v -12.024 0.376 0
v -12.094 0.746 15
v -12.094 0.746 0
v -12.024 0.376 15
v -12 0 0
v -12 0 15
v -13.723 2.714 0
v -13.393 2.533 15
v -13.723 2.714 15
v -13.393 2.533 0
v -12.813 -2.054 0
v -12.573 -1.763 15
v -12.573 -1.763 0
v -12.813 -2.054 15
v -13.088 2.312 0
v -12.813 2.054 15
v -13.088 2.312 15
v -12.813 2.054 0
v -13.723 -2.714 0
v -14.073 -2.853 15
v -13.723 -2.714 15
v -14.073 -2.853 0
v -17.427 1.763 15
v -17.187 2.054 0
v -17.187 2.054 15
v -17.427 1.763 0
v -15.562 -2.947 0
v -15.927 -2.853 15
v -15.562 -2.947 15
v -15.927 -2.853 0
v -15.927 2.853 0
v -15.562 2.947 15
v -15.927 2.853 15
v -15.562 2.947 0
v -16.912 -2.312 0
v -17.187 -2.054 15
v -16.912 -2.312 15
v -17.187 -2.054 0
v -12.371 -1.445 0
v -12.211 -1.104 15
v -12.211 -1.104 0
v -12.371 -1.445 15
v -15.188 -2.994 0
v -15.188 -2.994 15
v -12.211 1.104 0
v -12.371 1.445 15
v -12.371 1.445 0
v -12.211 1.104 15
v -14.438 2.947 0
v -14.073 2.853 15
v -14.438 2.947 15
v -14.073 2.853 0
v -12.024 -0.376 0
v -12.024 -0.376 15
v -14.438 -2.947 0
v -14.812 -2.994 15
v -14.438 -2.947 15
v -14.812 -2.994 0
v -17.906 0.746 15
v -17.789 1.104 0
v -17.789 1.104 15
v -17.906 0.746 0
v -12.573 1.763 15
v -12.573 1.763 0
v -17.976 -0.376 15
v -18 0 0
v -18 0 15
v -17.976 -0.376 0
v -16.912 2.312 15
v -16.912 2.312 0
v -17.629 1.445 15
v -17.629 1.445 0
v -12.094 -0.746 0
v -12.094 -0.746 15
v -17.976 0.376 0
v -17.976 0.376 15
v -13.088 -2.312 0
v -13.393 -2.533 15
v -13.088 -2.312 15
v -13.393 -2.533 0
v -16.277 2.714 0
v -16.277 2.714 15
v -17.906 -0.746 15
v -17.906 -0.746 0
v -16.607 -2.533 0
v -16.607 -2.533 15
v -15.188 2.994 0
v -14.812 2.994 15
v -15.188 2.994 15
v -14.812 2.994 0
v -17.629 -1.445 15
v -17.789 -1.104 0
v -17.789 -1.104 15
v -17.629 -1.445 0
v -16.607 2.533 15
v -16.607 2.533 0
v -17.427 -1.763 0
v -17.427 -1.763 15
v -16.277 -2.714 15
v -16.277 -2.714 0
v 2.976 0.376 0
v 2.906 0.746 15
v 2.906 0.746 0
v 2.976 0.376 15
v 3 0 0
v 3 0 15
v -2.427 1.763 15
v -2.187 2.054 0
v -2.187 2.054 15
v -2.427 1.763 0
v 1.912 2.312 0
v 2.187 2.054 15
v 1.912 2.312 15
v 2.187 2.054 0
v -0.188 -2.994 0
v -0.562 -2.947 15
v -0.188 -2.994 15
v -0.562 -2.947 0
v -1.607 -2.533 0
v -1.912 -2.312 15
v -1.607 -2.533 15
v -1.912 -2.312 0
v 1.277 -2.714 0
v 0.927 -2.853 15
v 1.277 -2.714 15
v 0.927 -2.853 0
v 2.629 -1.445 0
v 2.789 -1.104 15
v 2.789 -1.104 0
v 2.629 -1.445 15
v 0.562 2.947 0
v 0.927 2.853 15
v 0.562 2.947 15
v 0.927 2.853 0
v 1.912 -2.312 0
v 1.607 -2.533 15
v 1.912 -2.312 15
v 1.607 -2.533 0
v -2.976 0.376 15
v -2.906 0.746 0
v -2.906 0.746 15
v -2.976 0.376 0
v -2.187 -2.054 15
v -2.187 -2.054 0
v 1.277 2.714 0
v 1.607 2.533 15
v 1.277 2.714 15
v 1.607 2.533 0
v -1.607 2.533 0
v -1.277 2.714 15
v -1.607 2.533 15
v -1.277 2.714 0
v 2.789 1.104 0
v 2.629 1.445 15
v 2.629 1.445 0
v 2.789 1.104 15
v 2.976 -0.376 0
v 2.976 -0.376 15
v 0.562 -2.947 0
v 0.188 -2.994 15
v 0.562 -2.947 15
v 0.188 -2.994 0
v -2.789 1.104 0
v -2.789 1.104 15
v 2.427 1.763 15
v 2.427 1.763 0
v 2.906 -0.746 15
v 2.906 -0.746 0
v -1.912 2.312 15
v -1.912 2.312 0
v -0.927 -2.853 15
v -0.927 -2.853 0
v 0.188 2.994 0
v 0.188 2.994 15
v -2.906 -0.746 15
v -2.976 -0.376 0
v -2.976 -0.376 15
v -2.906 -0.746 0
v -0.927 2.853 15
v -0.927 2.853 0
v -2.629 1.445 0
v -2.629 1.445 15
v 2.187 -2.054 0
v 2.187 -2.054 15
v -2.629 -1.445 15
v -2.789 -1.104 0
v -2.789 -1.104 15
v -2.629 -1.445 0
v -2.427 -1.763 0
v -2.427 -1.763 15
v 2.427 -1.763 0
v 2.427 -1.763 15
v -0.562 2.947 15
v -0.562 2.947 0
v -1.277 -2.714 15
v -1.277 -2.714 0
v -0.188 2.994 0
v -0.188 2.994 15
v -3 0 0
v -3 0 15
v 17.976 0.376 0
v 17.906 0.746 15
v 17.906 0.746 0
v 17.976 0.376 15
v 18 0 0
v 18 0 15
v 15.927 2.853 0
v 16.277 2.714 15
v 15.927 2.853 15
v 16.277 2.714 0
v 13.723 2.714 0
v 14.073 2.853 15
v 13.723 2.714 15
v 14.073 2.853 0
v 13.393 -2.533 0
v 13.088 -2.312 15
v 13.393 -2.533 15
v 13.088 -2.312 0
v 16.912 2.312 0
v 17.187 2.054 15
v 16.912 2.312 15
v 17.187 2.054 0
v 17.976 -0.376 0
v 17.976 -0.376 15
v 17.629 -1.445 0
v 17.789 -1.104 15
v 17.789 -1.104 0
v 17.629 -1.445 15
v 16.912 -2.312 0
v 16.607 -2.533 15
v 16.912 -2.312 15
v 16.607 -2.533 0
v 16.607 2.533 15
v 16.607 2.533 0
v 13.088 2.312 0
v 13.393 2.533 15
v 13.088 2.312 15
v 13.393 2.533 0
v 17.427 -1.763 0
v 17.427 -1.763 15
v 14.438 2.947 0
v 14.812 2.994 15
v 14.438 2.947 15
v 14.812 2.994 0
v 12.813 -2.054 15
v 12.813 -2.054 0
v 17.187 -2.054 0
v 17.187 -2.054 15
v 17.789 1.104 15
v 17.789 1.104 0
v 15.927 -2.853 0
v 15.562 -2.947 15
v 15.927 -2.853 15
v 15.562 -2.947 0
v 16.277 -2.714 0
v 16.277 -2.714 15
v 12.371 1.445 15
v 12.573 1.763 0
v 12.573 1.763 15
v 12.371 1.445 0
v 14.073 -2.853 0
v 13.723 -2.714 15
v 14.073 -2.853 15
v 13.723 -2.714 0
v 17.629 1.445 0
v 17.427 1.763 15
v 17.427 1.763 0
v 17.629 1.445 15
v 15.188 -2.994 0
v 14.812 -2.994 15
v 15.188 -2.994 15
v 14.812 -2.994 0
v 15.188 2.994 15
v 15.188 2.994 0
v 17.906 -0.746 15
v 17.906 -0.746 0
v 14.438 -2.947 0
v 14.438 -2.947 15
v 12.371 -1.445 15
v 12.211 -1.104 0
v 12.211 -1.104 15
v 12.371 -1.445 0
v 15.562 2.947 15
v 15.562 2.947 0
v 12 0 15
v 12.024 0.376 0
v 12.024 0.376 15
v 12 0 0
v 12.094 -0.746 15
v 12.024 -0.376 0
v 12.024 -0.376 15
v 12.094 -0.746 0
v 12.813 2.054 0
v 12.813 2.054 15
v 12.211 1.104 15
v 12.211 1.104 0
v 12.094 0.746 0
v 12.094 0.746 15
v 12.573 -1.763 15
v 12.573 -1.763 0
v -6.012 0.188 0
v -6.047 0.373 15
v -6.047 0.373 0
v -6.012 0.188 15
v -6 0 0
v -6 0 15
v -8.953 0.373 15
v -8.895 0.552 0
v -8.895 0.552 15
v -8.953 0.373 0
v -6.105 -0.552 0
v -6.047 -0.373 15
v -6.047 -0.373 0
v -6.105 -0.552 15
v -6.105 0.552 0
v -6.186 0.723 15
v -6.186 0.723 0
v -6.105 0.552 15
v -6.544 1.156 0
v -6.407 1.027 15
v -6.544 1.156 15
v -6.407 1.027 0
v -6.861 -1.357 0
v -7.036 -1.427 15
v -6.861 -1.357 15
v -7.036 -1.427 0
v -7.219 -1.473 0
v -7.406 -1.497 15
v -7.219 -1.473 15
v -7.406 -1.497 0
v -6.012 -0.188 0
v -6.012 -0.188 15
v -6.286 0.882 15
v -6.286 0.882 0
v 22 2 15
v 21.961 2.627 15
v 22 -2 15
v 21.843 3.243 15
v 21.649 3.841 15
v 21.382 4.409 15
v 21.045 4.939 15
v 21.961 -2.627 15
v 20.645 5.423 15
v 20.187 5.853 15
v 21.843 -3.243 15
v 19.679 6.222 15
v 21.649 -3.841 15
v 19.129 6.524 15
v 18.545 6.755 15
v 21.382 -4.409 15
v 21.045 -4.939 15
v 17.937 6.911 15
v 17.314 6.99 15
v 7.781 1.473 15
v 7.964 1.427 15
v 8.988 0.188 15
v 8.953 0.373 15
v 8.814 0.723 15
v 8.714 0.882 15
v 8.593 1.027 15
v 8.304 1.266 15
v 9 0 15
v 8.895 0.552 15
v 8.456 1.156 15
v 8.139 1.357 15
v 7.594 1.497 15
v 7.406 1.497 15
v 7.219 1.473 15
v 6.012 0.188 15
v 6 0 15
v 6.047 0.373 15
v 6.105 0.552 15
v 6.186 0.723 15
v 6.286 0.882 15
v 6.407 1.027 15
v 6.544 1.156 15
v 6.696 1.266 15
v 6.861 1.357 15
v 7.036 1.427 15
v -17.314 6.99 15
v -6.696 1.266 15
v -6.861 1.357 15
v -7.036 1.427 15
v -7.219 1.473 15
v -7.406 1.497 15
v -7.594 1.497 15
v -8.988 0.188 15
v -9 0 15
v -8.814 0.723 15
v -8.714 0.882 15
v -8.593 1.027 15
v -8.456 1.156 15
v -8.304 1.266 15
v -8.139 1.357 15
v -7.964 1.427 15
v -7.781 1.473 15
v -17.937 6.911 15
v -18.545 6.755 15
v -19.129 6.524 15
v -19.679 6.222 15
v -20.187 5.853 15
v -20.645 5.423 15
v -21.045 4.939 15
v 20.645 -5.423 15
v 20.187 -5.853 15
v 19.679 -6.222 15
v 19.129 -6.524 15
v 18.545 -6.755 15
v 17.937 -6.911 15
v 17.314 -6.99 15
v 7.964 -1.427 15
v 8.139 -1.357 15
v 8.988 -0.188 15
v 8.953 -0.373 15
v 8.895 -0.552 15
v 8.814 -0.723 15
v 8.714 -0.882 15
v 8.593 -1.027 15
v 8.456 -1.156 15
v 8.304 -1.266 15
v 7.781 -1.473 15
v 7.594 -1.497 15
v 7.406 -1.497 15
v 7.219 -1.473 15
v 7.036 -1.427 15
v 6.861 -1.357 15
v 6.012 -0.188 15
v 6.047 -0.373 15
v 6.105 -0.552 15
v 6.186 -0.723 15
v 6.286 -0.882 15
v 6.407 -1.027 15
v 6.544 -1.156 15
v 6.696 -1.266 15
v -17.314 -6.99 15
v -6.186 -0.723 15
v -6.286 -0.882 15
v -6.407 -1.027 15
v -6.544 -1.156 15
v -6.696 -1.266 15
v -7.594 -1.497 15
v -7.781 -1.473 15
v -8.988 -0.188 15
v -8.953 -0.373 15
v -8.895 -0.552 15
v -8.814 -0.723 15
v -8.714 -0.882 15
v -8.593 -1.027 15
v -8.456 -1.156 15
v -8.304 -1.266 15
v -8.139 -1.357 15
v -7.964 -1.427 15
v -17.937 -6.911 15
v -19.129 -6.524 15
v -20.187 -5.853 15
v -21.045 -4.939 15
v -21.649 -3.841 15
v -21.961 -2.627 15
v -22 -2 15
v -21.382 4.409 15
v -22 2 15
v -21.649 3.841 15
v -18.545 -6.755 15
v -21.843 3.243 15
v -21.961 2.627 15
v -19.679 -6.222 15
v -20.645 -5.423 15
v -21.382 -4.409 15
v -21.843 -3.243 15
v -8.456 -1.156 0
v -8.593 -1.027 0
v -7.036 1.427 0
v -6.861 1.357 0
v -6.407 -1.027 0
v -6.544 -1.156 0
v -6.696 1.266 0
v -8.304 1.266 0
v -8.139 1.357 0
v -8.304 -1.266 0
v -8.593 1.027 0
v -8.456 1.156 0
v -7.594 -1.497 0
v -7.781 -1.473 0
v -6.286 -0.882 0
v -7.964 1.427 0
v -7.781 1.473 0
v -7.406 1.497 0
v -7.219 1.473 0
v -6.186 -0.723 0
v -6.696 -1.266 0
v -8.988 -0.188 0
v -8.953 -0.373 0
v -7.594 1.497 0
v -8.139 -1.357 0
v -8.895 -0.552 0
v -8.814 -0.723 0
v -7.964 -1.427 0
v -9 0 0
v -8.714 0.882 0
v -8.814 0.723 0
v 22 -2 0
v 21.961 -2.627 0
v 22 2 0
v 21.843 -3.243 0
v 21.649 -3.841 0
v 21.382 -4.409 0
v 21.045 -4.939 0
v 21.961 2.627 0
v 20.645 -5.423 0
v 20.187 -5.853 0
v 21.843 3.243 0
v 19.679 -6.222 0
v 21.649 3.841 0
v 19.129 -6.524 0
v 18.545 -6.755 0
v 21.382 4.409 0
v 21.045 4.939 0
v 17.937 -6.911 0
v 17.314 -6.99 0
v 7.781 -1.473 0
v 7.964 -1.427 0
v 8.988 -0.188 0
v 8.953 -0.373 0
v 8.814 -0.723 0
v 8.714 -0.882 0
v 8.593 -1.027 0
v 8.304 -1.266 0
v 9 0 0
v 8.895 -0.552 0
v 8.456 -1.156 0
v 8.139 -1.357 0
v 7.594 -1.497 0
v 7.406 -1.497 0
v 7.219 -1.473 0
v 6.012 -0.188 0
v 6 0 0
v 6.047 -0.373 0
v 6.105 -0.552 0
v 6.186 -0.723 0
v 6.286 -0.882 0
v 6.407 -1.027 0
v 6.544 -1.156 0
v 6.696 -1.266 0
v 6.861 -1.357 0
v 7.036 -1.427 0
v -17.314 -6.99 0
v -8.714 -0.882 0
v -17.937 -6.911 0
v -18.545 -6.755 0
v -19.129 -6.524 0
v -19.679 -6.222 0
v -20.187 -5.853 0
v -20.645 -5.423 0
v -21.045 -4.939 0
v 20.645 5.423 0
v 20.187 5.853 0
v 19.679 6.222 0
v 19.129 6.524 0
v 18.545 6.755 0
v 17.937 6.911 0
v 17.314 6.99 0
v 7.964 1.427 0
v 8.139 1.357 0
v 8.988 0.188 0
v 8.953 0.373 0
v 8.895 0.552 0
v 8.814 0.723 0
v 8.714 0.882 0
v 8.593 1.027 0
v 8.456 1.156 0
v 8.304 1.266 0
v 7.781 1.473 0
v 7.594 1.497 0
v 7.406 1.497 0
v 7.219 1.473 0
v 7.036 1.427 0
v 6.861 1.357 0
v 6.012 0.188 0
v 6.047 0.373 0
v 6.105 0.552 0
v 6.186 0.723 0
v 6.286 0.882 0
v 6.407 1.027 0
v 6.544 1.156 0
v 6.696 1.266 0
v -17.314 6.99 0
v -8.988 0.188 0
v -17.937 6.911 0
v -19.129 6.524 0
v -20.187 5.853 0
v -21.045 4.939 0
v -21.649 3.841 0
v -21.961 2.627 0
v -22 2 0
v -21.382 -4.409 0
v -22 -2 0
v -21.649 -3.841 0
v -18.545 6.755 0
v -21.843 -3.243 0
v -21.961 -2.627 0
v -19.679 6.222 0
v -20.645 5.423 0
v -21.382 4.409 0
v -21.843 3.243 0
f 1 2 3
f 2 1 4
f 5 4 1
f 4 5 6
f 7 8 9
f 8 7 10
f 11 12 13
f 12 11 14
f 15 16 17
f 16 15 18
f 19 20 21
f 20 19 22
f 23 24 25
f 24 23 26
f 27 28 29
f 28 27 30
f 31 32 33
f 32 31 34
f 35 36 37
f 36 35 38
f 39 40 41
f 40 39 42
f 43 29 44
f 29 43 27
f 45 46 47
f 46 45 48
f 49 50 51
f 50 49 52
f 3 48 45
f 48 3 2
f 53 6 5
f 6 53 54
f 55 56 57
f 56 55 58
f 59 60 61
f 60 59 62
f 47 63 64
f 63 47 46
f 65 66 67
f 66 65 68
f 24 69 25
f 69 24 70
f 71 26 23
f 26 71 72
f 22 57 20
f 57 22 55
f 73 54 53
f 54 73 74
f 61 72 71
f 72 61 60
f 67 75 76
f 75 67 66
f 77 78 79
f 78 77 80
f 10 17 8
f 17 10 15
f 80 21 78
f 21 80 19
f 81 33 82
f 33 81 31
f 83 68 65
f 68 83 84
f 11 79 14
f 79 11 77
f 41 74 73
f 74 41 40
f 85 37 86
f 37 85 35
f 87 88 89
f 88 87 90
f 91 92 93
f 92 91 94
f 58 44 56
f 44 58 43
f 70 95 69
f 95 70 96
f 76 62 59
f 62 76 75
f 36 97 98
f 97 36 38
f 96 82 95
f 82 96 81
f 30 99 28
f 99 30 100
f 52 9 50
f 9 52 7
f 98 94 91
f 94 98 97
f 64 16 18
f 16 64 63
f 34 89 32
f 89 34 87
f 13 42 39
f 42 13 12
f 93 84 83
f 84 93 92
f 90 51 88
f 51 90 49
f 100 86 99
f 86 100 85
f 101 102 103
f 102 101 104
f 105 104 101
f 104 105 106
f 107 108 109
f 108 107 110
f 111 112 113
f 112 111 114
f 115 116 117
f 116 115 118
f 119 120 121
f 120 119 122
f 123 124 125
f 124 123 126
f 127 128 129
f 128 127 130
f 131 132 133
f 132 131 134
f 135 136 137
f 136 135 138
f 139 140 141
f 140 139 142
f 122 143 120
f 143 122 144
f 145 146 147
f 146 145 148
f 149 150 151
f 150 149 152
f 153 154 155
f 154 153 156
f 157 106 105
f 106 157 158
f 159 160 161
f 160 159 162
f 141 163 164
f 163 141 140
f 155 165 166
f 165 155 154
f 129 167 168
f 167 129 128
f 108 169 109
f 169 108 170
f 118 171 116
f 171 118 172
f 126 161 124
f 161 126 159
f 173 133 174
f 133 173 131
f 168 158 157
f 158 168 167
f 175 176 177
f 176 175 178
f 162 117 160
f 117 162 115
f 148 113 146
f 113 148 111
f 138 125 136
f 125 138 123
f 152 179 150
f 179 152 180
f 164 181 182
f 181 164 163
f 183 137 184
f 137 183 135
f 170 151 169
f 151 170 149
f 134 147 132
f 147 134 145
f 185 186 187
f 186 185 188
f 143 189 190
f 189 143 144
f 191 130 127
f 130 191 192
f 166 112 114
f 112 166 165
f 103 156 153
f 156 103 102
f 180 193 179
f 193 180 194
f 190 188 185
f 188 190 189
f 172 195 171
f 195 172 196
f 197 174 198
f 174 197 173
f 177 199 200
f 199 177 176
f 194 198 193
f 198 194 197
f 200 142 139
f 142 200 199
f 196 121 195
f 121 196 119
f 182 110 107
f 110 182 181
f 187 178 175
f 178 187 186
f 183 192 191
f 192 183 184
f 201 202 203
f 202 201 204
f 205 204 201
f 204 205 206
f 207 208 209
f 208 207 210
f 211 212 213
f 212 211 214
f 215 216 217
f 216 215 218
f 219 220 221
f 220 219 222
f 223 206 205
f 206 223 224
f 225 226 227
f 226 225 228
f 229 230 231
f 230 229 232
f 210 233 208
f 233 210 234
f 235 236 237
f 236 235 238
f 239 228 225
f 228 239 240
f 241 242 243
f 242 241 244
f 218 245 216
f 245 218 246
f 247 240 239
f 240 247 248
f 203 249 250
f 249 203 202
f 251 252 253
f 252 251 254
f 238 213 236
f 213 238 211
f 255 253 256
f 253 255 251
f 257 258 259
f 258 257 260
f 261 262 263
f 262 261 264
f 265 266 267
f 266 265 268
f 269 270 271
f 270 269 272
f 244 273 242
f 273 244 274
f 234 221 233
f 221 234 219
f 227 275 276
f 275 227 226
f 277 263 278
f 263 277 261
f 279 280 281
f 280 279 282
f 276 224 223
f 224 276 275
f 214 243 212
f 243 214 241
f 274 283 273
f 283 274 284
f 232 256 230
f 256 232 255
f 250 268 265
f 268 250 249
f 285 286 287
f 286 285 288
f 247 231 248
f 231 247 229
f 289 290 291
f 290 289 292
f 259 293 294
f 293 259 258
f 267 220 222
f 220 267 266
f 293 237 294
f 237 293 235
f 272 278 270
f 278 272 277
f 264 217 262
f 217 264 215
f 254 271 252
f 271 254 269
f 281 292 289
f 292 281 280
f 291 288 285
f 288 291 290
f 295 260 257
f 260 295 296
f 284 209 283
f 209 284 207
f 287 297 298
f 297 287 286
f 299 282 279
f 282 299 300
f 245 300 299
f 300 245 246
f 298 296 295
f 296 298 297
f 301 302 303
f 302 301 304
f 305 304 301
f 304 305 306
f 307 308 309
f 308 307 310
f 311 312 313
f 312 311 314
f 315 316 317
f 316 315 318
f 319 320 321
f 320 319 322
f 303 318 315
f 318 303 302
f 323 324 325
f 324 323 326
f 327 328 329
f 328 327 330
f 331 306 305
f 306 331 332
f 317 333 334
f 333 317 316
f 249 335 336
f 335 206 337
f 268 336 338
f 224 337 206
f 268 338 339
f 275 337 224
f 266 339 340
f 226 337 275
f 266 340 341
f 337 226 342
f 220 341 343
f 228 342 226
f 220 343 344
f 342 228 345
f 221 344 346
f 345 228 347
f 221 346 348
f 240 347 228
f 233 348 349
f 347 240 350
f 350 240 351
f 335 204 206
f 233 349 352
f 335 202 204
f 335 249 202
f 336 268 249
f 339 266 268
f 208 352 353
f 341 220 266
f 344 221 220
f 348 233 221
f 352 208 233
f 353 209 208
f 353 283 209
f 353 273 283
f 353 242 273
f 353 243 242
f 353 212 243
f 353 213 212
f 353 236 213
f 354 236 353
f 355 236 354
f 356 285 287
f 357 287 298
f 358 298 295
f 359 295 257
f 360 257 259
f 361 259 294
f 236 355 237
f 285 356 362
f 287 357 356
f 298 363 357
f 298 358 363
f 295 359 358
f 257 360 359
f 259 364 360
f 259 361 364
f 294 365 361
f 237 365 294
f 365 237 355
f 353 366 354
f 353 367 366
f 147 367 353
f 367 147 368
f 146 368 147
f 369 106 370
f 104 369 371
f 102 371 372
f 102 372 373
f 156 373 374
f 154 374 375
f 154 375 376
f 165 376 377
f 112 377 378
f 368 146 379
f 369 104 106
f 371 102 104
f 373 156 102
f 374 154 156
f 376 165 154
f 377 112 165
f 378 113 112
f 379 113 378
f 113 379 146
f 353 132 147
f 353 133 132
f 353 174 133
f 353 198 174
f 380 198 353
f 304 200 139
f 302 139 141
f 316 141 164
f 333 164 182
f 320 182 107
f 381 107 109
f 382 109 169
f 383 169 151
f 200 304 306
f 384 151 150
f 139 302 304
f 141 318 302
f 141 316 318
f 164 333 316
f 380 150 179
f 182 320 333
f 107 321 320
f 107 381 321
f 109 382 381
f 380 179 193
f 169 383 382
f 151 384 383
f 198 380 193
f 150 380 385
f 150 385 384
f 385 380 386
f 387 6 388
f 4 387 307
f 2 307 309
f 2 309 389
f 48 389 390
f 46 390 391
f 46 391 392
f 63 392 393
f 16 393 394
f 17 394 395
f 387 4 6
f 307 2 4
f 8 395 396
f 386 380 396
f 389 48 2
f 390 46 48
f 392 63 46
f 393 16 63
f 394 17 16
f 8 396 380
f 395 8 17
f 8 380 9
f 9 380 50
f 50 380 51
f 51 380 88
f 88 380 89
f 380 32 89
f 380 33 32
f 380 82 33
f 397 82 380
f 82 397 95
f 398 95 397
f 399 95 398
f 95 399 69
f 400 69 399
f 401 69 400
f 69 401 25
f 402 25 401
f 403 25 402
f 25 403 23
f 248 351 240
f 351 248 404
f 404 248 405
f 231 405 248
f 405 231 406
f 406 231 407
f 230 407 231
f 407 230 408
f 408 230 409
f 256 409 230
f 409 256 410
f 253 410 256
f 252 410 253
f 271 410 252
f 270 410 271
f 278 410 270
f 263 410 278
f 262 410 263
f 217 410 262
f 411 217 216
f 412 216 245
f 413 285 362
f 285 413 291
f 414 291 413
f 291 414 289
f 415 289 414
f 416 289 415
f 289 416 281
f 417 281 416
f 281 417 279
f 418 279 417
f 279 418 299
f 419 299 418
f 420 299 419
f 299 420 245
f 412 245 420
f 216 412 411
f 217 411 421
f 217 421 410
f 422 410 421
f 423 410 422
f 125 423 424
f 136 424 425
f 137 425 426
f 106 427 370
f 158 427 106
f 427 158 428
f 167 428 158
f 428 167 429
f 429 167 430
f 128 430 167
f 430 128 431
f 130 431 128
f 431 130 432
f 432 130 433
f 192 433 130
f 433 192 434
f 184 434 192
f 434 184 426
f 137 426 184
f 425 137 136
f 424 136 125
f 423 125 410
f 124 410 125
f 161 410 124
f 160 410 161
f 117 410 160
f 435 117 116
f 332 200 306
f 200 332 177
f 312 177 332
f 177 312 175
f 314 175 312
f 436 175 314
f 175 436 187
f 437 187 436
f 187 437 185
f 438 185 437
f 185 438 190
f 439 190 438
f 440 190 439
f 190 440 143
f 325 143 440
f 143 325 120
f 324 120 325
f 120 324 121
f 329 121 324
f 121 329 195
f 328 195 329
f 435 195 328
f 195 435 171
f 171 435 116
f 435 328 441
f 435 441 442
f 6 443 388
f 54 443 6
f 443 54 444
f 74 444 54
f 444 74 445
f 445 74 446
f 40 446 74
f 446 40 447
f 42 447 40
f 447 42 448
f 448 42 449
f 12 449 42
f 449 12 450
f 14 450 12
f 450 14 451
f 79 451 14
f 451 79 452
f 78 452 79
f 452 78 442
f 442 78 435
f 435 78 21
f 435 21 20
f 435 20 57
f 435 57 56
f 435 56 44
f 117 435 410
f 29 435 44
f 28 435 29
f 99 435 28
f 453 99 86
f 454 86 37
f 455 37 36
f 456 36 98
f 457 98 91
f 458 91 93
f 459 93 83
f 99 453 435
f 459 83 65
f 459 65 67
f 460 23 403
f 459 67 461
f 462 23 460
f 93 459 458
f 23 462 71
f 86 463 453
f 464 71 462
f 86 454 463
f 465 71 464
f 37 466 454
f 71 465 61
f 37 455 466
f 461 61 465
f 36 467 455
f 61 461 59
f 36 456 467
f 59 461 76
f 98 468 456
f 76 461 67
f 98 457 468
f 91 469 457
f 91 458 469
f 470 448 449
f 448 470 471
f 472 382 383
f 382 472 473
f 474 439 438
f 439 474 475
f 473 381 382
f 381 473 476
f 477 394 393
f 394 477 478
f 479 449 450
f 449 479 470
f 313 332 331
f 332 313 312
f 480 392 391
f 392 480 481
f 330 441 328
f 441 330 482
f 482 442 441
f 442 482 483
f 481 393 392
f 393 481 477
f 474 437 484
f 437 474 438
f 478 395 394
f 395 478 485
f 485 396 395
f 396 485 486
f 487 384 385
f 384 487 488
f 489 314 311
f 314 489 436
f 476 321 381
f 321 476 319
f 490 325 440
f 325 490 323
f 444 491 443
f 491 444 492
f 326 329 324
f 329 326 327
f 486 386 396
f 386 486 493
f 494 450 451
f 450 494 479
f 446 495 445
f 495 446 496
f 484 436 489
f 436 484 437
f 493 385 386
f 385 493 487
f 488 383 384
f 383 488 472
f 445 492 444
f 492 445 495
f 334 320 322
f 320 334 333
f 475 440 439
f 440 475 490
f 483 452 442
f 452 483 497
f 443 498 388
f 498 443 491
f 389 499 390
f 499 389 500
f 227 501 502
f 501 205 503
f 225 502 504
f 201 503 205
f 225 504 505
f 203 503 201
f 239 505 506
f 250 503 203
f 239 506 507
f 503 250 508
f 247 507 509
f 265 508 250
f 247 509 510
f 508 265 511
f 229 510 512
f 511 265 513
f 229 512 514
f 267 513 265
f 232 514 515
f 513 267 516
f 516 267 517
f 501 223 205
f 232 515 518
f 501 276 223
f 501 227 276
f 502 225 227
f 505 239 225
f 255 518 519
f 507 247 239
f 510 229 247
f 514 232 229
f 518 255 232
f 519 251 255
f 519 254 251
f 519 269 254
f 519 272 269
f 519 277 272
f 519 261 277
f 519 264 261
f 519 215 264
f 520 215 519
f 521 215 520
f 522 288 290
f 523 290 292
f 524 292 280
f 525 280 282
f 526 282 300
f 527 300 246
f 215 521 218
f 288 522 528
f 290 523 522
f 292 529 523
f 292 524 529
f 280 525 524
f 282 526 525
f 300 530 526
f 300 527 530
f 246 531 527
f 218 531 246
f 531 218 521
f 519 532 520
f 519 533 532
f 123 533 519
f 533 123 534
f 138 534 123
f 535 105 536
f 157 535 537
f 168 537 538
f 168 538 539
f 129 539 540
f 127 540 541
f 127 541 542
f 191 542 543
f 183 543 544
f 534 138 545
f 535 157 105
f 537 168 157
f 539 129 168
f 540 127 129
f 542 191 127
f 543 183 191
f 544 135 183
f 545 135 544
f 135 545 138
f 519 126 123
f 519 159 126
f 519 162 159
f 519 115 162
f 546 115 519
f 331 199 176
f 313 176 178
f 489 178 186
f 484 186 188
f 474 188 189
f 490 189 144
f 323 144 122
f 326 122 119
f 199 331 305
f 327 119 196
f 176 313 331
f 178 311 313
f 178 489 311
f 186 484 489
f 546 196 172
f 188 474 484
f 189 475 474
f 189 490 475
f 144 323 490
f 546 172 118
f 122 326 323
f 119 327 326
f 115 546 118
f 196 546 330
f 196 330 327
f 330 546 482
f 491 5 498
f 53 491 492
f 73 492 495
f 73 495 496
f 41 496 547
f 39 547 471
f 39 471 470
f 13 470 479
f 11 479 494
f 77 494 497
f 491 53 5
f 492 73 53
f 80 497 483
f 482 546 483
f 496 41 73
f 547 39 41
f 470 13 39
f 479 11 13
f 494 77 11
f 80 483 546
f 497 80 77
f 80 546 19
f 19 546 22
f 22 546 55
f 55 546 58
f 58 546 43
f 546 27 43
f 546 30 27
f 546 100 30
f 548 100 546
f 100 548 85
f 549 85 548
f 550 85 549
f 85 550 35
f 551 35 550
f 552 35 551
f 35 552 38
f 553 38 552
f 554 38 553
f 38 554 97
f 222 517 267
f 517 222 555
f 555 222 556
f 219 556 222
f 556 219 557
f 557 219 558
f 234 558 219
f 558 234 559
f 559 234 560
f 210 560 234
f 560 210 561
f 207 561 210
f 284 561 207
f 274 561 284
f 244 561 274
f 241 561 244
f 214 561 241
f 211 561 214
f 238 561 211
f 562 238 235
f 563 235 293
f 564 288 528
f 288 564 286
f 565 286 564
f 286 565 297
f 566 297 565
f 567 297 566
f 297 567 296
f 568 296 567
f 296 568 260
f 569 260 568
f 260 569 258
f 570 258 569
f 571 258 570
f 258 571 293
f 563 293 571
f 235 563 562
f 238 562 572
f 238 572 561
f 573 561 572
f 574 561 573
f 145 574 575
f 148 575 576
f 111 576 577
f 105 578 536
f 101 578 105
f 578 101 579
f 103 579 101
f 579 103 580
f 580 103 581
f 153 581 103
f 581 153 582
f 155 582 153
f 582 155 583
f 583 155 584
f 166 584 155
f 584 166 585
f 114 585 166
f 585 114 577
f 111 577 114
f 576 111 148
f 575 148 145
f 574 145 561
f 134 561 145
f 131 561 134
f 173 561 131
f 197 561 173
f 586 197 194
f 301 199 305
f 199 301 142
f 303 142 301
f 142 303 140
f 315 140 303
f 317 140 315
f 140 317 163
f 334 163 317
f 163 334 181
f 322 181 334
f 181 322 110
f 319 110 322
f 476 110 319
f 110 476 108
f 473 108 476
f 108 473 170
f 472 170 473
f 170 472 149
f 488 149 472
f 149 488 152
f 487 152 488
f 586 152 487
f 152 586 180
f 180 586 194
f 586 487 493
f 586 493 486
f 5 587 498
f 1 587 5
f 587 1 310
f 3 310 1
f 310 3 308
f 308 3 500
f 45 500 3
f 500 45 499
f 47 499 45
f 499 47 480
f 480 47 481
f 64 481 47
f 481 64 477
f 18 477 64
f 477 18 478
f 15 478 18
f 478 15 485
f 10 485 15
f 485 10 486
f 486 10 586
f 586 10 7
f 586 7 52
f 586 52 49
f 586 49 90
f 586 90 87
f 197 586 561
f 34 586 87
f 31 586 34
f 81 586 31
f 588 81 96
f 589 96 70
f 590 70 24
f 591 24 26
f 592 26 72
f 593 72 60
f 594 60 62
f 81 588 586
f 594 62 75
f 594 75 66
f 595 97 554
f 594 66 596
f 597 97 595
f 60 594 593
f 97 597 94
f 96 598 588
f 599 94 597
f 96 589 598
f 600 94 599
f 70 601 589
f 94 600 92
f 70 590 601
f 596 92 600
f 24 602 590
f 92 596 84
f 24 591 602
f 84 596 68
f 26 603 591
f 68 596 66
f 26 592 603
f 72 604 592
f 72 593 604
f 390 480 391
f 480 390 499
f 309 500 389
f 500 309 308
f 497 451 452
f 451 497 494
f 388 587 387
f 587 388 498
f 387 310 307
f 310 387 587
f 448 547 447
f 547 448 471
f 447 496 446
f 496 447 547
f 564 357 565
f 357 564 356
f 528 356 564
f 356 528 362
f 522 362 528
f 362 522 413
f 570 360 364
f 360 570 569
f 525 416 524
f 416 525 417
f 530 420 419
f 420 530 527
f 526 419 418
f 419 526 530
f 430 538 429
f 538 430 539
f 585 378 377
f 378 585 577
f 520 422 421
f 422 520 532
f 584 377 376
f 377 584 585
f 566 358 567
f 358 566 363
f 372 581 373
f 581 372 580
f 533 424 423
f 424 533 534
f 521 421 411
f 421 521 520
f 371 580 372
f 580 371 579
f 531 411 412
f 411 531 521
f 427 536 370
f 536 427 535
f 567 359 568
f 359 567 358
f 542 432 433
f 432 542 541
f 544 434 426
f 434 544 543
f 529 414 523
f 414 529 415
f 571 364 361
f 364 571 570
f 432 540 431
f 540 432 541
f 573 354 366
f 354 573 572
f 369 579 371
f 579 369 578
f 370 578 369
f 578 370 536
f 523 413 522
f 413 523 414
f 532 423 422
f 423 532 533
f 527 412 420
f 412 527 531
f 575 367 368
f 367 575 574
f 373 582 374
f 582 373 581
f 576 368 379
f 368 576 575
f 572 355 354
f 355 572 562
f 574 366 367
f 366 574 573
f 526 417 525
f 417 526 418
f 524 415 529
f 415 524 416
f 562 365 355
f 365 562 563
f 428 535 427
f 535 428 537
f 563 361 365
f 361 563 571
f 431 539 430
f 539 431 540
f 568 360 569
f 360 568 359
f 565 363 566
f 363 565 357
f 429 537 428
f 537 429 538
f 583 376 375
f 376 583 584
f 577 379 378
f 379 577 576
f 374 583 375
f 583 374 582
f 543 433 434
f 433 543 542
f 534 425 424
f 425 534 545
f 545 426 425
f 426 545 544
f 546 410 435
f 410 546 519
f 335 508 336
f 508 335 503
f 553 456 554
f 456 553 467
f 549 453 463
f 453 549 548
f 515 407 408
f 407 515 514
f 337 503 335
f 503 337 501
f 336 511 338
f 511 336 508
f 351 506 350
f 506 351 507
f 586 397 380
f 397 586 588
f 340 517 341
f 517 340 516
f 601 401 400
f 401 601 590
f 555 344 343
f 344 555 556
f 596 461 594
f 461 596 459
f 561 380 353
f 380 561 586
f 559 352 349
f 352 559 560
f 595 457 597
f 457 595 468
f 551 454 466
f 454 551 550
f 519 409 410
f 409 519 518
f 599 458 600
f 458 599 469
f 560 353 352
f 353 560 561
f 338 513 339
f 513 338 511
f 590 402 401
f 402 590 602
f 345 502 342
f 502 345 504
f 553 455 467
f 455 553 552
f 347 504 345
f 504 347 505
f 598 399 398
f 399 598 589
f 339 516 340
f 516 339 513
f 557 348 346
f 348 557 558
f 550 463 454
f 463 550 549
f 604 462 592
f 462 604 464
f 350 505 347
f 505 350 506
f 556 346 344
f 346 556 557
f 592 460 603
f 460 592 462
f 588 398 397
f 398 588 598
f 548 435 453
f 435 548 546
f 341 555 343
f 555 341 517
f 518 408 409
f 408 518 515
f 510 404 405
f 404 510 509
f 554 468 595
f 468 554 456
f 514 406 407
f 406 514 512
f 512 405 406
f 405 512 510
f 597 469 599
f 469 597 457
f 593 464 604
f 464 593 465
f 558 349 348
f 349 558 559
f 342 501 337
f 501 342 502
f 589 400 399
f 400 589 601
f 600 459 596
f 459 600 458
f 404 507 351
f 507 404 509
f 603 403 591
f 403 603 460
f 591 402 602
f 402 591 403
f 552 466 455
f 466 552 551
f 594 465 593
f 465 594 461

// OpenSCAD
$fn = 50;


difference() {
	union() {
		hull() {
			translate(v = [-17.0000000000, 2.0000000000, 0]) {
				cylinder(h = 15, r = 5);
			}
			translate(v = [17.0000000000, 2.0000000000, 0]) {
				cylinder(h = 15, r = 5);
			}
			translate(v = [-17.0000000000, -2.0000000000, 0]) {
				cylinder(h = 15, r = 5);
			}
			translate(v = [17.0000000000, -2.0000000000, 0]) {
				cylinder(h = 15, r = 5);
			}
		}
	}
	union() {
		translate(v = [-15.0000000000, 0.0000000000, -100.0000000000]) {
			cylinder(h = 200, r = 3.0000000000);
		}
		translate(v = [0.0000000000, 0.0000000000, -100.0000000000]) {
			cylinder(h = 200, r = 3.0000000000);
		}
		translate(v = [15.0000000000, 0.0000000000, -100.0000000000]) {
			cylinder(h = 200, r = 3.0000000000);
		}
		translate(v = [-15.0000000000, 0.0000000000, 0]) {
			cylinder(h = 15, r = 1.5000000000);
		}
		translate(v = [-7.5000000000, 0.0000000000, 0]) {
			cylinder(h = 15, r = 1.5000000000);
		}
		cylinder(h = 15, r = 1.5000000000);
		translate(v = [7.5000000000, 0.0000000000, 0]) {
			cylinder(h = 15, r = 1.5000000000);
		}
		translate(v = [15.0000000000, 0.0000000000, 0]) {
			cylinder(h = 15, r = 1.5000000000);
		}
		translate(v = [-15.0000000000, 0.0000000000, 0]) {
			cylinder(h = 15, r = 1.5000000000);
		}
		translate(v = [-7.5000000000, 0.0000000000, 0]) {
			cylinder(h = 15, r = 1.5000000000);
		}
		cylinder(h = 15, r = 1.5000000000);
		translate(v = [7.5000000000, 0.0000000000, 0]) {
			cylinder(h = 15, r = 1.5000000000);
		}
		translate(v = [15.0000000000, 0.0000000000, 0]) {
			cylinder(h = 15, r = 1.5000000000);
		}
		translate(v = [-15.0000000000, 0.0000000000, 0]) {
			cylinder(h = 15, r = 1.5000000000);
		}
		translate(v = [-7.5000000000, 0.0000000000, 0]) {
			cylinder(h = 15, r = 1.5000000000);
		}
		cylinder(h = 15, r = 1.5000000000);
		translate(v = [7.5000000000, 0.0000000000, 0]) {
			cylinder(h = 15, r = 1.5000000000);
		}
		translate(v = [15.0000000000, 0.0000000000, 0]) {
			cylinder(h = 15, r = 1.5000000000);
		}
	}
}
